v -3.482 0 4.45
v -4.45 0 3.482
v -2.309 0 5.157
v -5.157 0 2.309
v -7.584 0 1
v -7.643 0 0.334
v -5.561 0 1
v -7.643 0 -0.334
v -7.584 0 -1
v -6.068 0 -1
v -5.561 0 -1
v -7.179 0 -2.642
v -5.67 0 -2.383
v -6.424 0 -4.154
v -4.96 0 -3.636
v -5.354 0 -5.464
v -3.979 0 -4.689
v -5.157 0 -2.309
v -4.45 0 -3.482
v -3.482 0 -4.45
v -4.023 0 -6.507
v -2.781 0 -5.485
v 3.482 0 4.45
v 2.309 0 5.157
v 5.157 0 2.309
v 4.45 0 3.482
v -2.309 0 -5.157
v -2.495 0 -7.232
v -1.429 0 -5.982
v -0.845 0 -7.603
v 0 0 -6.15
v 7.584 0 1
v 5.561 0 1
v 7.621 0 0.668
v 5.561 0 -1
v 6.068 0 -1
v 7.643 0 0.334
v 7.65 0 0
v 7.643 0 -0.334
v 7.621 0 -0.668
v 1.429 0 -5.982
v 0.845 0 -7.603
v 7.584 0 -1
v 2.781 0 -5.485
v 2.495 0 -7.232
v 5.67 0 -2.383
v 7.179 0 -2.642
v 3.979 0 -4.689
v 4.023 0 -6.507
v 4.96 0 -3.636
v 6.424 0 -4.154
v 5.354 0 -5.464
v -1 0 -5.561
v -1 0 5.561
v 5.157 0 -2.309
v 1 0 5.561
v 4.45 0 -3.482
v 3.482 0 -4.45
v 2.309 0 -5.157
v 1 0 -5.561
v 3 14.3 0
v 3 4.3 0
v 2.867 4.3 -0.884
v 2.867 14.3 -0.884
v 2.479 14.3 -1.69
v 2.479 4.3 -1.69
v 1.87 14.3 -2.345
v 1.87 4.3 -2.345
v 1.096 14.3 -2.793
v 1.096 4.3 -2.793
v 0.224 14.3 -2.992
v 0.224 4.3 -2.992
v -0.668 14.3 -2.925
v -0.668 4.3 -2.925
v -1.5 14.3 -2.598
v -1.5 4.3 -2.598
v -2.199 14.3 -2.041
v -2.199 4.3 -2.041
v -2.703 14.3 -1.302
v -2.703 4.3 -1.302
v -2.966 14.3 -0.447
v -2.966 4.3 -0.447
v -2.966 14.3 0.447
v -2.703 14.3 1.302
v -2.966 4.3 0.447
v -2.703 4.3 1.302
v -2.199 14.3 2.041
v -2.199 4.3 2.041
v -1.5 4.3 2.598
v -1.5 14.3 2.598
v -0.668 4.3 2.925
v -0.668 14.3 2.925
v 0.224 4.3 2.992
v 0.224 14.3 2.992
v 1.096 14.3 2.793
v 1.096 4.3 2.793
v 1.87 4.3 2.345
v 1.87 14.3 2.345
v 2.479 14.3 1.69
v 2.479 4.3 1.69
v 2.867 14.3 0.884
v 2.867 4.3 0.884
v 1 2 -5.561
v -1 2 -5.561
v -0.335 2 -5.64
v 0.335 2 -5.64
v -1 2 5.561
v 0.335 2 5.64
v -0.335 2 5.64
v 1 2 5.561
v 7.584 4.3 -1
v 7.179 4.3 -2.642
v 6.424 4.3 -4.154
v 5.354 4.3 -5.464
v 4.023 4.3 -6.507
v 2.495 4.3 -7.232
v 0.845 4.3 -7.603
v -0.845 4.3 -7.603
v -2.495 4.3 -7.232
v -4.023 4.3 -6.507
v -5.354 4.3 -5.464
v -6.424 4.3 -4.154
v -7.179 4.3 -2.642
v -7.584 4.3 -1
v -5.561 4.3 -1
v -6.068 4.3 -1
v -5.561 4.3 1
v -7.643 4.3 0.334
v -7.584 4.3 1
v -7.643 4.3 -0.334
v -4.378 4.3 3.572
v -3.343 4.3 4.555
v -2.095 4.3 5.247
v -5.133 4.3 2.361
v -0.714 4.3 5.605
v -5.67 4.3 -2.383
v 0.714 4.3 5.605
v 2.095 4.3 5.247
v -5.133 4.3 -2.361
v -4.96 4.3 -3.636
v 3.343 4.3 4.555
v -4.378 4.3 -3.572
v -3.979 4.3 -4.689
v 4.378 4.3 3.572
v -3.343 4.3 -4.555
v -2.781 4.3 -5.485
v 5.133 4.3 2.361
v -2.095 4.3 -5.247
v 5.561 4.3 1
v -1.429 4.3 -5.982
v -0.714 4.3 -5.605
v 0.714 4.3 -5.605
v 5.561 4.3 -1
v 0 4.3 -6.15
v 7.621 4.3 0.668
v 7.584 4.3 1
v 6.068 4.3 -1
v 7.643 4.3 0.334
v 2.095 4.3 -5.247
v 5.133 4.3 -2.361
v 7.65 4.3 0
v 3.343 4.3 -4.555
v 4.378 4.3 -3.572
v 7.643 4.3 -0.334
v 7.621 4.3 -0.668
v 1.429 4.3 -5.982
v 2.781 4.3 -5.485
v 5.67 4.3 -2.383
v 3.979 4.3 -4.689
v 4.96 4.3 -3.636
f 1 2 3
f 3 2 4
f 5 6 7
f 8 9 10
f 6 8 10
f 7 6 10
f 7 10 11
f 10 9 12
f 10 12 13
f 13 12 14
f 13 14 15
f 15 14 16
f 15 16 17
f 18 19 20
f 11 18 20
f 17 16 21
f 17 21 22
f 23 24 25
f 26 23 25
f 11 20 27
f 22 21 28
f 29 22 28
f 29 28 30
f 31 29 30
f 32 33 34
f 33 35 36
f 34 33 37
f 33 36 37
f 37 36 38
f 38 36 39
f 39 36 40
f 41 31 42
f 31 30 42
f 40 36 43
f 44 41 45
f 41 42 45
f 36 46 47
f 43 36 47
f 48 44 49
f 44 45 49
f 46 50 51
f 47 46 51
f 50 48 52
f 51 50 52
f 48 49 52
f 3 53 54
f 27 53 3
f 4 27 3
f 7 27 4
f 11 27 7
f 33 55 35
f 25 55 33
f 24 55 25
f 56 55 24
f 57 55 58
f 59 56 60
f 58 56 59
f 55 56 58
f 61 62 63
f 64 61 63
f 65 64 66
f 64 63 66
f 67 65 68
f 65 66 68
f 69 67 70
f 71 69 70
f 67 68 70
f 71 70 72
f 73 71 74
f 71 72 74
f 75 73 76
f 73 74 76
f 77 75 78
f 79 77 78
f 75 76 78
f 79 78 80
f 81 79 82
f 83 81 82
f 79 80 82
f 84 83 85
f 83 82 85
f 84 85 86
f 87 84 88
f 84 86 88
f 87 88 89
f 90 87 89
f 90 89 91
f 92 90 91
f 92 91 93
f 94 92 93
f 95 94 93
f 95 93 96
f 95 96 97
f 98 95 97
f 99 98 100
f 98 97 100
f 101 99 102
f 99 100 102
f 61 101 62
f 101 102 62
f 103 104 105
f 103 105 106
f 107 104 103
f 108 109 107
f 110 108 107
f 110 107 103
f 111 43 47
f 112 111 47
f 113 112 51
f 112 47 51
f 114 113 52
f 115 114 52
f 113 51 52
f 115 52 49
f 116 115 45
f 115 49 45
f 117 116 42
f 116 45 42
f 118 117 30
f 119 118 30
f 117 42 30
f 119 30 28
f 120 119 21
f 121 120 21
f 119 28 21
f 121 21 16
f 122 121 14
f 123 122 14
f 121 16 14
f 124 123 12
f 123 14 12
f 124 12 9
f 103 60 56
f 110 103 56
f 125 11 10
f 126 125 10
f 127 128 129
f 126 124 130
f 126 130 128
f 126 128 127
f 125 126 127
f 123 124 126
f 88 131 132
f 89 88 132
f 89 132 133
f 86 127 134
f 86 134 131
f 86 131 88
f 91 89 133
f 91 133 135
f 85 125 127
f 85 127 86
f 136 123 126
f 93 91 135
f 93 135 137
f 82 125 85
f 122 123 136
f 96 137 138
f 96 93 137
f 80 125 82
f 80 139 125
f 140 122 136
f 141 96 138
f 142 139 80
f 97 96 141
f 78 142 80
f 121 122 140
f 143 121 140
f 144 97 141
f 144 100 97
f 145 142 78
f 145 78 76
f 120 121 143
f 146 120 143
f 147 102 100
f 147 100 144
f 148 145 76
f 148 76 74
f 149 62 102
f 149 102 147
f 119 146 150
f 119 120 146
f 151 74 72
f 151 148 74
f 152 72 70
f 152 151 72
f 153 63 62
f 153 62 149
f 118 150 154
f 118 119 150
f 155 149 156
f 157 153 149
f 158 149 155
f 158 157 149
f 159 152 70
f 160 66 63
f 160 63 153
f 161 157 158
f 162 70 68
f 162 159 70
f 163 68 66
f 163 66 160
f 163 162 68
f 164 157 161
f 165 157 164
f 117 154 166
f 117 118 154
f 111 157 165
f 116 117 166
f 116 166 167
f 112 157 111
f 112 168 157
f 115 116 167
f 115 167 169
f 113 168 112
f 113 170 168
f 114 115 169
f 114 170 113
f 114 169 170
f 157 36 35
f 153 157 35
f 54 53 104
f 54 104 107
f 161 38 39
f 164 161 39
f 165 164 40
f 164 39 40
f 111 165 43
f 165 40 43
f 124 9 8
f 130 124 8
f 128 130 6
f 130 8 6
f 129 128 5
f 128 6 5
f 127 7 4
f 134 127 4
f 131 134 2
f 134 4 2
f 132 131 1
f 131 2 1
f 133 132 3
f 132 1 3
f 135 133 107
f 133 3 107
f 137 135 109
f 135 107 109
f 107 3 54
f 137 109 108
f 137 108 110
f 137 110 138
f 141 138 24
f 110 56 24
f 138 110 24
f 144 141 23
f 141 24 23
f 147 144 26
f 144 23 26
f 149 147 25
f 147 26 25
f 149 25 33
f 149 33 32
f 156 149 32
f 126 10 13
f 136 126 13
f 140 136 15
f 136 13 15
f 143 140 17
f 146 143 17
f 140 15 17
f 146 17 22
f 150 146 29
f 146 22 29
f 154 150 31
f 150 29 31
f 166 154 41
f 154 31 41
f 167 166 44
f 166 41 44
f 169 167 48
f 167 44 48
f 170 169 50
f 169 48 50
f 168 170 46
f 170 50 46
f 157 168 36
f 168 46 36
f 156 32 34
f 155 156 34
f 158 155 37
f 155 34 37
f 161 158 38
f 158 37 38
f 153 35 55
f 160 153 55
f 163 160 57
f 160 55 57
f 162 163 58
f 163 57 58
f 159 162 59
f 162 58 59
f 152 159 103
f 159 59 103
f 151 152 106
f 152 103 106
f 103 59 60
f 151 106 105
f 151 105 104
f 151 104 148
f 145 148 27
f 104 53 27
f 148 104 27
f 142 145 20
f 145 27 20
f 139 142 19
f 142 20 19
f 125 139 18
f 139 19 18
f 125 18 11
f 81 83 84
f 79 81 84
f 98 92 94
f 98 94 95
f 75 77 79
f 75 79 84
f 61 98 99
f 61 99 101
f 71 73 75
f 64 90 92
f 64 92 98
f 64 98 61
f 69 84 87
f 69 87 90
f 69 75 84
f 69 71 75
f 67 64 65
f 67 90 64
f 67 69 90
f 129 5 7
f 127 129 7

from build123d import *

# Parameters (mm, degrees)
BOSS_EXTRUDE1_DEPTH = 4.3
SKETCH2_R           = 3
BOSS_EXTRUDE2_DEPTH = 10
SKETCH3_W           = 2
SKETCH3_H           = 11.870992598
CUT_EXTRUDE1_DEPTH  = 2


with BuildPart() as part:
    # Sketch1 → Boss-Extrude1 (new body)
    with BuildSketch(Plane(origin=(0, 0, 0), x_dir=(1, 0, 0), z_dir=(0, 1, 0))):
        with BuildLine():
            Line((5.560800302, -1), (-5.560800302, -1))
            ThreePointArc((-5.560800302, -1), (0, -5.65), (5.560800302, -1))
        make_face()
        with BuildLine():
            Line((5.560800302, 1), (-5.560800302, 1))
            ThreePointArc((-5.560800302, 1), (-5.65, 0), (-5.560800302, -1))
            Line((-5.560800302, -1), (5.560800302, -1))
            ThreePointArc((5.560800302, -1), (5.627655893, -0.501985205), (5.65, 0))
            ThreePointArc((5.65, 0), (5.627655893, 0.501985205), (5.560800302, 1))
        make_face()
        with BuildLine():
            ThreePointArc((5.560800302, 1), (0, 5.65), (-5.560800302, 1))
            Line((-5.560800302, 1), (5.560800302, 1))
        make_face()
        with BuildLine():
            Line((-5.560800302, 1), (-6.068154579, 1))
            ThreePointArc((-6.068154579, 1), (-6.15, 0), (-6.068154579, -1))
            Line((-6.068154579, -1), (-5.560800302, -1))
            ThreePointArc((-5.560800302, -1), (-5.65, 0), (-5.560800302, 1))
        make_face()
        with BuildLine():
            ThreePointArc((6.15, 0), (6.129504493, 0.501671873), (6.068154579, 1))
            Line((6.068154579, 1), (5.560800302, 1))
            ThreePointArc((5.560800302, 1), (5.627655893, 0.501985205), (5.65, 0))
            ThreePointArc((5.65, 0), (5.627655893, -0.501985205), (5.560800302, -1))
            Line((5.560800302, -1), (6.068154579, -1))
            ThreePointArc((6.068154579, -1), (6.129504493, -0.501671873), (6.15, 0))
        make_face()
        with BuildLine():
            Line((-6.068154579, 1), (-7.584358905, 1))
            ThreePointArc((-7.584358905, 1), (-7.65, 0), (-7.584358905, -1))
            Line((-7.584358905, -1), (-6.068154579, -1))
            ThreePointArc((-6.068154579, -1), (-6.15, 0), (-6.068154579, 1))
        make_face()
        with BuildLine():
            ThreePointArc((7.65, 0), (7.633572087, 0.50107603), (7.584358905, 1))
            Line((7.584358905, 1), (6.068154579, 1))
            ThreePointArc((6.068154579, 1), (6.129504493, 0.501671873), (6.15, 0))
            ThreePointArc((6.15, 0), (6.129504493, -0.501671873), (6.068154579, -1))
            Line((6.068154579, -1), (7.584358905, -1))
            ThreePointArc((7.584358905, -1), (7.633572087, -0.50107603), (7.65, 0))
        make_face()
        with BuildLine():
            ThreePointArc((7.584358905, 1), (0, 7.65), (-7.584358905, 1))
            Line((-7.584358905, 1), (-6.068154579, 1))
            ThreePointArc((-6.068154579, 1), (0, 6.15), (6.068154579, 1))
            Line((6.068154579, 1), (7.584358905, 1))
        make_face()
    extrude(amount=BOSS_EXTRUDE1_DEPTH)

    # Sketch2 → Boss-Extrude2 (add)
    with BuildSketch(Plane(origin=(0, 4.3, 0), x_dir=(1, 0, 0), z_dir=(0, 1, 0))):
        Circle(SKETCH2_R)
    extrude(amount=BOSS_EXTRUDE2_DEPTH)

    # Sketch3 → Cut-Extrude1 (cut)
    with BuildSketch(Plane.XZ):
        Rectangle(SKETCH3_W, SKETCH3_H)
    extrude(amount=-CUT_EXTRUDE1_DEPTH, mode=Mode.SUBTRACT)


solid = part.part
